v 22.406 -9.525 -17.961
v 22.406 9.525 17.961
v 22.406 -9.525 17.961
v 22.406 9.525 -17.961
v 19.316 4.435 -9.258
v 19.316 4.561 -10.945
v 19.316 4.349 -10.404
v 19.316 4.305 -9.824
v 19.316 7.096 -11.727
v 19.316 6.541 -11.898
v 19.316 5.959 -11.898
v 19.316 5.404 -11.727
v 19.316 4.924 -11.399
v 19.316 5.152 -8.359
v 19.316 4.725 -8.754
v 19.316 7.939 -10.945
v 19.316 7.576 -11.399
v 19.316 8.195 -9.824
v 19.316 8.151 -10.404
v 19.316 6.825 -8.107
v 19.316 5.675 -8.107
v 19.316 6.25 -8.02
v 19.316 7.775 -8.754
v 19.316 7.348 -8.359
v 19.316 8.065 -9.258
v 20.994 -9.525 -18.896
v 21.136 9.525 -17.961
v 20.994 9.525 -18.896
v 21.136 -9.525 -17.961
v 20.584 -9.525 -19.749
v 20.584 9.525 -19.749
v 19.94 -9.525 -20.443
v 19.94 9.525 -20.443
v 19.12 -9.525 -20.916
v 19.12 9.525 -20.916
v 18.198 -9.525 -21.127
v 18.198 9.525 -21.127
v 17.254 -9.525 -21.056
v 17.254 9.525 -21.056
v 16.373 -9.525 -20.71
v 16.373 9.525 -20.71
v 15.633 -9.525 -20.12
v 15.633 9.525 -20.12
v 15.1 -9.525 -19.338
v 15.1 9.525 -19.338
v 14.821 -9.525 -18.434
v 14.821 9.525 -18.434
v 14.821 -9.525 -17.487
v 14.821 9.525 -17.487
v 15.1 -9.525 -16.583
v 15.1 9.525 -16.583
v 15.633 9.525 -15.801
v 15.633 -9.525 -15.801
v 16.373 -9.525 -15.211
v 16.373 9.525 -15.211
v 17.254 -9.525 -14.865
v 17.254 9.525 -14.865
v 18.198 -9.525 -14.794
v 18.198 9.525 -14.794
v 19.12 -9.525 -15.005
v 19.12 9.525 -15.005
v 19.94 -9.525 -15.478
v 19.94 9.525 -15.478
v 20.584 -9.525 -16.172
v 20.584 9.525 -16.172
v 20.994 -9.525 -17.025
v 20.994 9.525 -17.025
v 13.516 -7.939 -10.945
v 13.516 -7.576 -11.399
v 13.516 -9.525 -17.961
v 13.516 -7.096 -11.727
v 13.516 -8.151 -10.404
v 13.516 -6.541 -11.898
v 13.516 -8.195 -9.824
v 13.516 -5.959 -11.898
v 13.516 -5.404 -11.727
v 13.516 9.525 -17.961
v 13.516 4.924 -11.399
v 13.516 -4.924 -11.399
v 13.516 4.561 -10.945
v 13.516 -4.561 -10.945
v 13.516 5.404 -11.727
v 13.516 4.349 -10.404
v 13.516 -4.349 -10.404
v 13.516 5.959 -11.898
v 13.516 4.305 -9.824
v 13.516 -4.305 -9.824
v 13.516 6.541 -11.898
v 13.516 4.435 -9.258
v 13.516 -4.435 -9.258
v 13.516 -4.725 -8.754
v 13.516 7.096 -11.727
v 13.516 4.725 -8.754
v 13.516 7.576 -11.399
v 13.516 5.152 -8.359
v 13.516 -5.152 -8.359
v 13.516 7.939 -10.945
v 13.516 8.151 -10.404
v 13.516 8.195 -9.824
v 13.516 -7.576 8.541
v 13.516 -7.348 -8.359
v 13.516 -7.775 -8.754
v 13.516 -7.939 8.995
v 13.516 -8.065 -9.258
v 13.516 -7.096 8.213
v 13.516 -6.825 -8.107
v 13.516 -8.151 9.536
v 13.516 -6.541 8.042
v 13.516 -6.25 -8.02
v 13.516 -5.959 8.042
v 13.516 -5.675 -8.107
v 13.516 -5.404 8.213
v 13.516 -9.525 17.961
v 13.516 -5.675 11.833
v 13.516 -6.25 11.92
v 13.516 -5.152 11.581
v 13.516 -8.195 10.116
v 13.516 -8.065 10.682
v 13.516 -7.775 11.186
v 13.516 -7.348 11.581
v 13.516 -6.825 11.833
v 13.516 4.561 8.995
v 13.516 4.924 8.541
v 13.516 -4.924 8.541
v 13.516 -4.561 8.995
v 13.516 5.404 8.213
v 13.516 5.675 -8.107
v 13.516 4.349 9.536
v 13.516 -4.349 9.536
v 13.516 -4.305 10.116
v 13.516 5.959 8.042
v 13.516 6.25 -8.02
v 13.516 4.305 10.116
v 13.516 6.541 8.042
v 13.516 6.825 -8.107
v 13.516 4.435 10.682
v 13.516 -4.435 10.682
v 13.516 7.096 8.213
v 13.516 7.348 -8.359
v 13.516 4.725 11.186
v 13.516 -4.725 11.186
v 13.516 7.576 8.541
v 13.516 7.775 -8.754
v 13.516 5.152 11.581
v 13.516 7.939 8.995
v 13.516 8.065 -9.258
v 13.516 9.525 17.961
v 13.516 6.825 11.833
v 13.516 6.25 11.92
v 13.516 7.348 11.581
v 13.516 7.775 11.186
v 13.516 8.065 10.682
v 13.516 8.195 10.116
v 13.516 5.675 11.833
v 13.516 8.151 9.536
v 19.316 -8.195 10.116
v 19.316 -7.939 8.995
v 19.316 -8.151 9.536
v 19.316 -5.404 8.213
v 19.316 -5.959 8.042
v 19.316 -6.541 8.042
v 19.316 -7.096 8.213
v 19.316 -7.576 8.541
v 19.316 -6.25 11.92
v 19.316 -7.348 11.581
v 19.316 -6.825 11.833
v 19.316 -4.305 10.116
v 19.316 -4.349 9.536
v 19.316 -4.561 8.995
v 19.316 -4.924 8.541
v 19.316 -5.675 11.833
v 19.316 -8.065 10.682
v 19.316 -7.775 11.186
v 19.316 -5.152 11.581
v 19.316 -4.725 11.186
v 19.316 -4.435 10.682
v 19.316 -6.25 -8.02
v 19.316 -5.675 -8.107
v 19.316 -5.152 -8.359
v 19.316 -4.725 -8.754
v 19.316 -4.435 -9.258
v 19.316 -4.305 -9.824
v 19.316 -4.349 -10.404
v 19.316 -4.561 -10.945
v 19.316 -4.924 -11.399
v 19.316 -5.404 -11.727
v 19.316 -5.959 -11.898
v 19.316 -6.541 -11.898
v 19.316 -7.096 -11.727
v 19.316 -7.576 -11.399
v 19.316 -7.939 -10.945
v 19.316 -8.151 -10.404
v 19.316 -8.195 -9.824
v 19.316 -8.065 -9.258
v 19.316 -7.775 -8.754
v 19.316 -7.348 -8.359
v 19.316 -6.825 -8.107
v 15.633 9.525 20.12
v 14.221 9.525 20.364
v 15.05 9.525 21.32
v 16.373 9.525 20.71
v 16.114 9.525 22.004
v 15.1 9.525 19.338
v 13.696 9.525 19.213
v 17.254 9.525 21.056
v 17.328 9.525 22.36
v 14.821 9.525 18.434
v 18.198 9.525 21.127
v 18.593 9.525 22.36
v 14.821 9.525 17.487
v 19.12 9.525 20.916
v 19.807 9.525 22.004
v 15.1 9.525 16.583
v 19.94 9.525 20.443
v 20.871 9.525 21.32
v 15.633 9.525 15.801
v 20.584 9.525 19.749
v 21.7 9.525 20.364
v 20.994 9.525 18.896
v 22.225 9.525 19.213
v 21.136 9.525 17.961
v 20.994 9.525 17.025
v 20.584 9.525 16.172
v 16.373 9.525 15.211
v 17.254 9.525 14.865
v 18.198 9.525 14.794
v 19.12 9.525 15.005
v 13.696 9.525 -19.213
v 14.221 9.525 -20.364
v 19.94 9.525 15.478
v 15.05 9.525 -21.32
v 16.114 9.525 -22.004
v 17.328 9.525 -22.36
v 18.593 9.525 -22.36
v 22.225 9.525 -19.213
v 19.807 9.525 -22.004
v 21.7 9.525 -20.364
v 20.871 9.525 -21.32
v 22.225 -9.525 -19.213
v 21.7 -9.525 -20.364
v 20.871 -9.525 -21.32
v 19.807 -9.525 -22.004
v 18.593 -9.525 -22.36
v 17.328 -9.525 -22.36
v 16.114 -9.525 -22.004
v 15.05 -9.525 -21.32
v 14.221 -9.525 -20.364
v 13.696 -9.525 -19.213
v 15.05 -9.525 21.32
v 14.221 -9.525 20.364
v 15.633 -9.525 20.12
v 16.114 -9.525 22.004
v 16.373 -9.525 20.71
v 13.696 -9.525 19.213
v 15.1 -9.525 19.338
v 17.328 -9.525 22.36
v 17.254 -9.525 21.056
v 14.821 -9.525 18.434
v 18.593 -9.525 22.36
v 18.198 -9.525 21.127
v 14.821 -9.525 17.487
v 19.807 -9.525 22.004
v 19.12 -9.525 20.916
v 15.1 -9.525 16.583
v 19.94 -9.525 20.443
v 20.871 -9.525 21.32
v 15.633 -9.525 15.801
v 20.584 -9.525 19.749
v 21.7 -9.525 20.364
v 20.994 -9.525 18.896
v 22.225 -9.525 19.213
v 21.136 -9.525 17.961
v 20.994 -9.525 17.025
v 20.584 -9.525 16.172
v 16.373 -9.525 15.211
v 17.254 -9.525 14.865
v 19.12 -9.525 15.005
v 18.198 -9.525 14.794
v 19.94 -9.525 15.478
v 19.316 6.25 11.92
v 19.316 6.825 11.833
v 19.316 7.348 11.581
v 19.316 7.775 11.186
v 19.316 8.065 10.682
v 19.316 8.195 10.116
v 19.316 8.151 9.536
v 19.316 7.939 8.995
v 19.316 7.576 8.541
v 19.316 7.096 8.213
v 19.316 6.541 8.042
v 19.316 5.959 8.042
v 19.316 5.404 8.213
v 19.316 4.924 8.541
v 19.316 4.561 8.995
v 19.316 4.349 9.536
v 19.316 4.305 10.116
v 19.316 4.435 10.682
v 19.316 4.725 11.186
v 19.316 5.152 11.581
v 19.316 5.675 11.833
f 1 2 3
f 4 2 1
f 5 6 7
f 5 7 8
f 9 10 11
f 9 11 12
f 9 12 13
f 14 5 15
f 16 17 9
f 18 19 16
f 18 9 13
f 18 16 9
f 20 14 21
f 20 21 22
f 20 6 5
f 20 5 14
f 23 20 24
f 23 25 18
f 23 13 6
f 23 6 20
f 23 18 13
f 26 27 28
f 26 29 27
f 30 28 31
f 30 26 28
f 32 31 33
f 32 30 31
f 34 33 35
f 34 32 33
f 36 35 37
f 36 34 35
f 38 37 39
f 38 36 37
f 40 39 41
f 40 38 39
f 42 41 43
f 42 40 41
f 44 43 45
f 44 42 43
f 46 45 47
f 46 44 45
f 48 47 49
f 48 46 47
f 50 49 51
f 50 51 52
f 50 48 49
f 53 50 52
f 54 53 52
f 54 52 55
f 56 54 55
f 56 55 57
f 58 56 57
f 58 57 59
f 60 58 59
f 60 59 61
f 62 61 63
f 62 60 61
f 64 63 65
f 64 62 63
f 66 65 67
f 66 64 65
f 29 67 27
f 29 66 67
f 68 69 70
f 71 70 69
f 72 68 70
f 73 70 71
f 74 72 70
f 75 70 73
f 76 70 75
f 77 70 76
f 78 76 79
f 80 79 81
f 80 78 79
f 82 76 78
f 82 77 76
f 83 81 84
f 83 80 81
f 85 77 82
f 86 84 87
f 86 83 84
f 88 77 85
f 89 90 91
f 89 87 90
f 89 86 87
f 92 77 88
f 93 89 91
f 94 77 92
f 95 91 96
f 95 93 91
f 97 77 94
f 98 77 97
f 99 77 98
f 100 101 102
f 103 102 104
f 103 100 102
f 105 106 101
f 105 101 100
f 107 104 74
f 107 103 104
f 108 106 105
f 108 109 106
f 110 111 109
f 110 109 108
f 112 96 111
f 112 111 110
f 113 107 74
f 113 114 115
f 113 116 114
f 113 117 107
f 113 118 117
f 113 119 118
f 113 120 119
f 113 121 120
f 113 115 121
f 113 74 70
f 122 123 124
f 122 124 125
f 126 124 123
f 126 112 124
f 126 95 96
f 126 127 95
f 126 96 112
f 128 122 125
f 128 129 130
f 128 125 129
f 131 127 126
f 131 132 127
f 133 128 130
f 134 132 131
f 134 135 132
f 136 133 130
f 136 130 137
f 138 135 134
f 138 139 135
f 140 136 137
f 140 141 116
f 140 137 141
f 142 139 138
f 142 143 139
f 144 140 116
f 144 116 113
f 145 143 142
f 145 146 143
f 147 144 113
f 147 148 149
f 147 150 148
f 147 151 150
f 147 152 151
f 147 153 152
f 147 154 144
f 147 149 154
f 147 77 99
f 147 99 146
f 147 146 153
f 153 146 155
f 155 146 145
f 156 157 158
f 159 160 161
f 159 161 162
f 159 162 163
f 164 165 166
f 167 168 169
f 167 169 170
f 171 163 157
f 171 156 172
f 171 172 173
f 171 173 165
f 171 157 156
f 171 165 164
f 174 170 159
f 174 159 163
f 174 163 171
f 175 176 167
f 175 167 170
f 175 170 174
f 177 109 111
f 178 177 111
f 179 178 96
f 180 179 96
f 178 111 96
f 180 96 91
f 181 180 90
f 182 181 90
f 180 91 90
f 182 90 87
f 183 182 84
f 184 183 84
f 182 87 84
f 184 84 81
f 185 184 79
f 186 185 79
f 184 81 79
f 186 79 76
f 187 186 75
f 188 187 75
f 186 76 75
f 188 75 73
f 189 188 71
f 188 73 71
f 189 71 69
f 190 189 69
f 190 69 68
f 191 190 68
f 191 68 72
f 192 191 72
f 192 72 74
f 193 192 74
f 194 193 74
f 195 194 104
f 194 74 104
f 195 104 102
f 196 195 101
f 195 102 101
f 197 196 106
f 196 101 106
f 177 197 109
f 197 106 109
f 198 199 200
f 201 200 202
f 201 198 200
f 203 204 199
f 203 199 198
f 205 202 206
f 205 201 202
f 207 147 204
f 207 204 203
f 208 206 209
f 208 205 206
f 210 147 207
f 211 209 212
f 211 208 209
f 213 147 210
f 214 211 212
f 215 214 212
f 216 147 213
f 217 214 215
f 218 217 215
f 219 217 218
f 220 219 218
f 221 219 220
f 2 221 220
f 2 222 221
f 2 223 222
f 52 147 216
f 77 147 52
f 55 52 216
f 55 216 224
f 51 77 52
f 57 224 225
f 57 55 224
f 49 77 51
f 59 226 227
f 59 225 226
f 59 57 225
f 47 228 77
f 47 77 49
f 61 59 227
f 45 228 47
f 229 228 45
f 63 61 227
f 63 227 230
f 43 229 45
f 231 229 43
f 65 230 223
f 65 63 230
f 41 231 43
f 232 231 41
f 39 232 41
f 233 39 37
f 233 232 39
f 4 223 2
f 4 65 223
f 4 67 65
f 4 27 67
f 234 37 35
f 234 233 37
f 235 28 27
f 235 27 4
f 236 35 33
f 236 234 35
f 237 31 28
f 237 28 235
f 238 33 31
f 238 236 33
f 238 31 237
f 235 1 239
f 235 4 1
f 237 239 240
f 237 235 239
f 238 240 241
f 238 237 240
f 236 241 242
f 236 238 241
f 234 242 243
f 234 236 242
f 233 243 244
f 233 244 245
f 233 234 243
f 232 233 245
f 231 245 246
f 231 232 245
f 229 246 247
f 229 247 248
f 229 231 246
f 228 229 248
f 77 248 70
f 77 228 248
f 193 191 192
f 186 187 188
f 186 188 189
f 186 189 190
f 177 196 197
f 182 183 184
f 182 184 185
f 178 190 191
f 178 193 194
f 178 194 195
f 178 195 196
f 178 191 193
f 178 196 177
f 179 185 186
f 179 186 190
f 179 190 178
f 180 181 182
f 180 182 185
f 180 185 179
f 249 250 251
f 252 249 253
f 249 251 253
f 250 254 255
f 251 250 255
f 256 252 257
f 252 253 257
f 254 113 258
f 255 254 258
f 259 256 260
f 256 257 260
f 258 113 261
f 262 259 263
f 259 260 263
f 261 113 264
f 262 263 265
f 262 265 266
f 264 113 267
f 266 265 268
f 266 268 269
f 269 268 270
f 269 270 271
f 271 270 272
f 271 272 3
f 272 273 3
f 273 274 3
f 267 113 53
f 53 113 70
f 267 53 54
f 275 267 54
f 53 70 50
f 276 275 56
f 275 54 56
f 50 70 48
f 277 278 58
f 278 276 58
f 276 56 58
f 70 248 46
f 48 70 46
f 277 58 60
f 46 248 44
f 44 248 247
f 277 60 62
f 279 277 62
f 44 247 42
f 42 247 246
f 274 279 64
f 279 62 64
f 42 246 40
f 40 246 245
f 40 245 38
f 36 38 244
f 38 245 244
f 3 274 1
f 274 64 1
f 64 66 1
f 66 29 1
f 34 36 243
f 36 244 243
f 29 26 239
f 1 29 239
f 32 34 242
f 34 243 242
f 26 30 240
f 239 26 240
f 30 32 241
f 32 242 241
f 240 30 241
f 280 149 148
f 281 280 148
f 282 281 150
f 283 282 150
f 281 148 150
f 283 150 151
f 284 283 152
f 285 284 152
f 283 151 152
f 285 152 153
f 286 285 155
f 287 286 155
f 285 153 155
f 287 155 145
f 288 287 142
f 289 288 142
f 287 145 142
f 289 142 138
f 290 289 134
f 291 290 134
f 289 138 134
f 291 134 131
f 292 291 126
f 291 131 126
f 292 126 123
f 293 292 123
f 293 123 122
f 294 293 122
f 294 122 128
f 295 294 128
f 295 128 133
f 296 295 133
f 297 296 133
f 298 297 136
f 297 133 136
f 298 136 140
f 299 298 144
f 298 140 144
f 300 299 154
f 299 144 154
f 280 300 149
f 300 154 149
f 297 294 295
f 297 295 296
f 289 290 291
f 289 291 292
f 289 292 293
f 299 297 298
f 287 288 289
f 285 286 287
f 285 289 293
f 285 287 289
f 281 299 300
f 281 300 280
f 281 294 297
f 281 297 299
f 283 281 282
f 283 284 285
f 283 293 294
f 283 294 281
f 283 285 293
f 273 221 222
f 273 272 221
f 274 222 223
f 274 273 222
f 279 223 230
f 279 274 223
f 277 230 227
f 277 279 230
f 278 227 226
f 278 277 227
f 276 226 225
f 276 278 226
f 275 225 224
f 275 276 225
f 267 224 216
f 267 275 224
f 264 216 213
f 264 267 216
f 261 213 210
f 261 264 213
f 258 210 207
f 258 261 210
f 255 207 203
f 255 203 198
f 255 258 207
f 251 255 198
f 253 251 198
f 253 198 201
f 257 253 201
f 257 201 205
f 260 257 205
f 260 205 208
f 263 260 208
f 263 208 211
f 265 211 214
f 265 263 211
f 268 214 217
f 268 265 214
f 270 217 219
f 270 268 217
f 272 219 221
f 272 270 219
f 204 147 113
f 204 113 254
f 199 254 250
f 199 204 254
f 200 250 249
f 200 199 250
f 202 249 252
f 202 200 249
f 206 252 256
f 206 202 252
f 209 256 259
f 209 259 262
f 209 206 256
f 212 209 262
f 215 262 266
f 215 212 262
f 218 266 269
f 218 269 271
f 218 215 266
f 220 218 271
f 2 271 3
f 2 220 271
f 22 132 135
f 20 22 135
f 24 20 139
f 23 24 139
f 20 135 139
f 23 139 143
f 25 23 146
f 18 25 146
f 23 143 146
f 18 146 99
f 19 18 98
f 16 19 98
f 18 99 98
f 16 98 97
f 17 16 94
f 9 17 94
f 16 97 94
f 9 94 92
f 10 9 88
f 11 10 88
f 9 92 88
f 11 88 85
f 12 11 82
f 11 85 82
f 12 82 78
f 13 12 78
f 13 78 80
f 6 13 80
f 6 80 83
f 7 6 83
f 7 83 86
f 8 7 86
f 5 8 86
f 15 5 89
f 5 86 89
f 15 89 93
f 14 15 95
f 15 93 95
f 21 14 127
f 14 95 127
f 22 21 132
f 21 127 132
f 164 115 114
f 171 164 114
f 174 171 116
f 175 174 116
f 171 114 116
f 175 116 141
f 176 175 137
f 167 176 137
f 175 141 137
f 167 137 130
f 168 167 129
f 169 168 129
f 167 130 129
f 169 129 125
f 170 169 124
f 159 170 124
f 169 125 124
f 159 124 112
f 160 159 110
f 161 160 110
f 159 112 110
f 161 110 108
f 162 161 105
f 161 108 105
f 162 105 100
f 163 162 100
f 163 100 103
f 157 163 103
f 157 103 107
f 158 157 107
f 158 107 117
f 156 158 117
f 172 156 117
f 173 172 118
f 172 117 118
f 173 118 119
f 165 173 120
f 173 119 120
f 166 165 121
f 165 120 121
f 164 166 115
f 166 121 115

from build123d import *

# Parameters (mm, degrees)
SKETCH2_R           = 3.175
BOSS_EXTRUDE1_DEPTH = 9.525
SKETCH3_R           = 1.95
CUT_EXTRUDE1_DEPTH  = 5.8


with BuildPart() as part:
    # Sketch2 → Boss-Extrude1 (new body, symmetric)
    with BuildSketch(Plane(origin=(0, 0, 0), x_dir=(1, 0, 0), z_dir=(0, 1, 0))):
        with BuildLine():
            Line((13.515512242, 17.960512242), (13.515512242, -17.960512242))
            ThreePointArc((13.515512242, -17.960512242), (17.960512242, -22.405512242), (22.405512242, -17.960512242))
            Line((22.405512242, -17.960512242), (22.405512242, 17.960512242))
            ThreePointArc((22.405512242, 17.960512242), (17.960512242, 22.405512242), (13.515512242, 17.960512242))
        make_face()
        with Locations((17.960512242, -17.960512242)):
            Circle(SKETCH2_R, mode=Mode.SUBTRACT)
        with Locations((17.960512242, 17.960512242)):
            Circle(SKETCH2_R, mode=Mode.SUBTRACT)
    extrude(amount=BOSS_EXTRUDE1_DEPTH, both=True)

    # Sketch3 → Cut-Extrude1 (cut)
    with BuildSketch(Plane.ZY.offset(-13.515512242)):
        with Locations((-9.97, 6.25)):
            Circle(SKETCH3_R)
        with Locations((9.97, 6.25)):
            Circle(SKETCH3_R)
        with Locations((9.97, -6.25)):
            Circle(SKETCH3_R)
        with Locations((-9.97, -6.25)):
            Circle(SKETCH3_R)
    extrude(amount=-CUT_EXTRUDE1_DEPTH, mode=Mode.SUBTRACT)


solid = part.part
